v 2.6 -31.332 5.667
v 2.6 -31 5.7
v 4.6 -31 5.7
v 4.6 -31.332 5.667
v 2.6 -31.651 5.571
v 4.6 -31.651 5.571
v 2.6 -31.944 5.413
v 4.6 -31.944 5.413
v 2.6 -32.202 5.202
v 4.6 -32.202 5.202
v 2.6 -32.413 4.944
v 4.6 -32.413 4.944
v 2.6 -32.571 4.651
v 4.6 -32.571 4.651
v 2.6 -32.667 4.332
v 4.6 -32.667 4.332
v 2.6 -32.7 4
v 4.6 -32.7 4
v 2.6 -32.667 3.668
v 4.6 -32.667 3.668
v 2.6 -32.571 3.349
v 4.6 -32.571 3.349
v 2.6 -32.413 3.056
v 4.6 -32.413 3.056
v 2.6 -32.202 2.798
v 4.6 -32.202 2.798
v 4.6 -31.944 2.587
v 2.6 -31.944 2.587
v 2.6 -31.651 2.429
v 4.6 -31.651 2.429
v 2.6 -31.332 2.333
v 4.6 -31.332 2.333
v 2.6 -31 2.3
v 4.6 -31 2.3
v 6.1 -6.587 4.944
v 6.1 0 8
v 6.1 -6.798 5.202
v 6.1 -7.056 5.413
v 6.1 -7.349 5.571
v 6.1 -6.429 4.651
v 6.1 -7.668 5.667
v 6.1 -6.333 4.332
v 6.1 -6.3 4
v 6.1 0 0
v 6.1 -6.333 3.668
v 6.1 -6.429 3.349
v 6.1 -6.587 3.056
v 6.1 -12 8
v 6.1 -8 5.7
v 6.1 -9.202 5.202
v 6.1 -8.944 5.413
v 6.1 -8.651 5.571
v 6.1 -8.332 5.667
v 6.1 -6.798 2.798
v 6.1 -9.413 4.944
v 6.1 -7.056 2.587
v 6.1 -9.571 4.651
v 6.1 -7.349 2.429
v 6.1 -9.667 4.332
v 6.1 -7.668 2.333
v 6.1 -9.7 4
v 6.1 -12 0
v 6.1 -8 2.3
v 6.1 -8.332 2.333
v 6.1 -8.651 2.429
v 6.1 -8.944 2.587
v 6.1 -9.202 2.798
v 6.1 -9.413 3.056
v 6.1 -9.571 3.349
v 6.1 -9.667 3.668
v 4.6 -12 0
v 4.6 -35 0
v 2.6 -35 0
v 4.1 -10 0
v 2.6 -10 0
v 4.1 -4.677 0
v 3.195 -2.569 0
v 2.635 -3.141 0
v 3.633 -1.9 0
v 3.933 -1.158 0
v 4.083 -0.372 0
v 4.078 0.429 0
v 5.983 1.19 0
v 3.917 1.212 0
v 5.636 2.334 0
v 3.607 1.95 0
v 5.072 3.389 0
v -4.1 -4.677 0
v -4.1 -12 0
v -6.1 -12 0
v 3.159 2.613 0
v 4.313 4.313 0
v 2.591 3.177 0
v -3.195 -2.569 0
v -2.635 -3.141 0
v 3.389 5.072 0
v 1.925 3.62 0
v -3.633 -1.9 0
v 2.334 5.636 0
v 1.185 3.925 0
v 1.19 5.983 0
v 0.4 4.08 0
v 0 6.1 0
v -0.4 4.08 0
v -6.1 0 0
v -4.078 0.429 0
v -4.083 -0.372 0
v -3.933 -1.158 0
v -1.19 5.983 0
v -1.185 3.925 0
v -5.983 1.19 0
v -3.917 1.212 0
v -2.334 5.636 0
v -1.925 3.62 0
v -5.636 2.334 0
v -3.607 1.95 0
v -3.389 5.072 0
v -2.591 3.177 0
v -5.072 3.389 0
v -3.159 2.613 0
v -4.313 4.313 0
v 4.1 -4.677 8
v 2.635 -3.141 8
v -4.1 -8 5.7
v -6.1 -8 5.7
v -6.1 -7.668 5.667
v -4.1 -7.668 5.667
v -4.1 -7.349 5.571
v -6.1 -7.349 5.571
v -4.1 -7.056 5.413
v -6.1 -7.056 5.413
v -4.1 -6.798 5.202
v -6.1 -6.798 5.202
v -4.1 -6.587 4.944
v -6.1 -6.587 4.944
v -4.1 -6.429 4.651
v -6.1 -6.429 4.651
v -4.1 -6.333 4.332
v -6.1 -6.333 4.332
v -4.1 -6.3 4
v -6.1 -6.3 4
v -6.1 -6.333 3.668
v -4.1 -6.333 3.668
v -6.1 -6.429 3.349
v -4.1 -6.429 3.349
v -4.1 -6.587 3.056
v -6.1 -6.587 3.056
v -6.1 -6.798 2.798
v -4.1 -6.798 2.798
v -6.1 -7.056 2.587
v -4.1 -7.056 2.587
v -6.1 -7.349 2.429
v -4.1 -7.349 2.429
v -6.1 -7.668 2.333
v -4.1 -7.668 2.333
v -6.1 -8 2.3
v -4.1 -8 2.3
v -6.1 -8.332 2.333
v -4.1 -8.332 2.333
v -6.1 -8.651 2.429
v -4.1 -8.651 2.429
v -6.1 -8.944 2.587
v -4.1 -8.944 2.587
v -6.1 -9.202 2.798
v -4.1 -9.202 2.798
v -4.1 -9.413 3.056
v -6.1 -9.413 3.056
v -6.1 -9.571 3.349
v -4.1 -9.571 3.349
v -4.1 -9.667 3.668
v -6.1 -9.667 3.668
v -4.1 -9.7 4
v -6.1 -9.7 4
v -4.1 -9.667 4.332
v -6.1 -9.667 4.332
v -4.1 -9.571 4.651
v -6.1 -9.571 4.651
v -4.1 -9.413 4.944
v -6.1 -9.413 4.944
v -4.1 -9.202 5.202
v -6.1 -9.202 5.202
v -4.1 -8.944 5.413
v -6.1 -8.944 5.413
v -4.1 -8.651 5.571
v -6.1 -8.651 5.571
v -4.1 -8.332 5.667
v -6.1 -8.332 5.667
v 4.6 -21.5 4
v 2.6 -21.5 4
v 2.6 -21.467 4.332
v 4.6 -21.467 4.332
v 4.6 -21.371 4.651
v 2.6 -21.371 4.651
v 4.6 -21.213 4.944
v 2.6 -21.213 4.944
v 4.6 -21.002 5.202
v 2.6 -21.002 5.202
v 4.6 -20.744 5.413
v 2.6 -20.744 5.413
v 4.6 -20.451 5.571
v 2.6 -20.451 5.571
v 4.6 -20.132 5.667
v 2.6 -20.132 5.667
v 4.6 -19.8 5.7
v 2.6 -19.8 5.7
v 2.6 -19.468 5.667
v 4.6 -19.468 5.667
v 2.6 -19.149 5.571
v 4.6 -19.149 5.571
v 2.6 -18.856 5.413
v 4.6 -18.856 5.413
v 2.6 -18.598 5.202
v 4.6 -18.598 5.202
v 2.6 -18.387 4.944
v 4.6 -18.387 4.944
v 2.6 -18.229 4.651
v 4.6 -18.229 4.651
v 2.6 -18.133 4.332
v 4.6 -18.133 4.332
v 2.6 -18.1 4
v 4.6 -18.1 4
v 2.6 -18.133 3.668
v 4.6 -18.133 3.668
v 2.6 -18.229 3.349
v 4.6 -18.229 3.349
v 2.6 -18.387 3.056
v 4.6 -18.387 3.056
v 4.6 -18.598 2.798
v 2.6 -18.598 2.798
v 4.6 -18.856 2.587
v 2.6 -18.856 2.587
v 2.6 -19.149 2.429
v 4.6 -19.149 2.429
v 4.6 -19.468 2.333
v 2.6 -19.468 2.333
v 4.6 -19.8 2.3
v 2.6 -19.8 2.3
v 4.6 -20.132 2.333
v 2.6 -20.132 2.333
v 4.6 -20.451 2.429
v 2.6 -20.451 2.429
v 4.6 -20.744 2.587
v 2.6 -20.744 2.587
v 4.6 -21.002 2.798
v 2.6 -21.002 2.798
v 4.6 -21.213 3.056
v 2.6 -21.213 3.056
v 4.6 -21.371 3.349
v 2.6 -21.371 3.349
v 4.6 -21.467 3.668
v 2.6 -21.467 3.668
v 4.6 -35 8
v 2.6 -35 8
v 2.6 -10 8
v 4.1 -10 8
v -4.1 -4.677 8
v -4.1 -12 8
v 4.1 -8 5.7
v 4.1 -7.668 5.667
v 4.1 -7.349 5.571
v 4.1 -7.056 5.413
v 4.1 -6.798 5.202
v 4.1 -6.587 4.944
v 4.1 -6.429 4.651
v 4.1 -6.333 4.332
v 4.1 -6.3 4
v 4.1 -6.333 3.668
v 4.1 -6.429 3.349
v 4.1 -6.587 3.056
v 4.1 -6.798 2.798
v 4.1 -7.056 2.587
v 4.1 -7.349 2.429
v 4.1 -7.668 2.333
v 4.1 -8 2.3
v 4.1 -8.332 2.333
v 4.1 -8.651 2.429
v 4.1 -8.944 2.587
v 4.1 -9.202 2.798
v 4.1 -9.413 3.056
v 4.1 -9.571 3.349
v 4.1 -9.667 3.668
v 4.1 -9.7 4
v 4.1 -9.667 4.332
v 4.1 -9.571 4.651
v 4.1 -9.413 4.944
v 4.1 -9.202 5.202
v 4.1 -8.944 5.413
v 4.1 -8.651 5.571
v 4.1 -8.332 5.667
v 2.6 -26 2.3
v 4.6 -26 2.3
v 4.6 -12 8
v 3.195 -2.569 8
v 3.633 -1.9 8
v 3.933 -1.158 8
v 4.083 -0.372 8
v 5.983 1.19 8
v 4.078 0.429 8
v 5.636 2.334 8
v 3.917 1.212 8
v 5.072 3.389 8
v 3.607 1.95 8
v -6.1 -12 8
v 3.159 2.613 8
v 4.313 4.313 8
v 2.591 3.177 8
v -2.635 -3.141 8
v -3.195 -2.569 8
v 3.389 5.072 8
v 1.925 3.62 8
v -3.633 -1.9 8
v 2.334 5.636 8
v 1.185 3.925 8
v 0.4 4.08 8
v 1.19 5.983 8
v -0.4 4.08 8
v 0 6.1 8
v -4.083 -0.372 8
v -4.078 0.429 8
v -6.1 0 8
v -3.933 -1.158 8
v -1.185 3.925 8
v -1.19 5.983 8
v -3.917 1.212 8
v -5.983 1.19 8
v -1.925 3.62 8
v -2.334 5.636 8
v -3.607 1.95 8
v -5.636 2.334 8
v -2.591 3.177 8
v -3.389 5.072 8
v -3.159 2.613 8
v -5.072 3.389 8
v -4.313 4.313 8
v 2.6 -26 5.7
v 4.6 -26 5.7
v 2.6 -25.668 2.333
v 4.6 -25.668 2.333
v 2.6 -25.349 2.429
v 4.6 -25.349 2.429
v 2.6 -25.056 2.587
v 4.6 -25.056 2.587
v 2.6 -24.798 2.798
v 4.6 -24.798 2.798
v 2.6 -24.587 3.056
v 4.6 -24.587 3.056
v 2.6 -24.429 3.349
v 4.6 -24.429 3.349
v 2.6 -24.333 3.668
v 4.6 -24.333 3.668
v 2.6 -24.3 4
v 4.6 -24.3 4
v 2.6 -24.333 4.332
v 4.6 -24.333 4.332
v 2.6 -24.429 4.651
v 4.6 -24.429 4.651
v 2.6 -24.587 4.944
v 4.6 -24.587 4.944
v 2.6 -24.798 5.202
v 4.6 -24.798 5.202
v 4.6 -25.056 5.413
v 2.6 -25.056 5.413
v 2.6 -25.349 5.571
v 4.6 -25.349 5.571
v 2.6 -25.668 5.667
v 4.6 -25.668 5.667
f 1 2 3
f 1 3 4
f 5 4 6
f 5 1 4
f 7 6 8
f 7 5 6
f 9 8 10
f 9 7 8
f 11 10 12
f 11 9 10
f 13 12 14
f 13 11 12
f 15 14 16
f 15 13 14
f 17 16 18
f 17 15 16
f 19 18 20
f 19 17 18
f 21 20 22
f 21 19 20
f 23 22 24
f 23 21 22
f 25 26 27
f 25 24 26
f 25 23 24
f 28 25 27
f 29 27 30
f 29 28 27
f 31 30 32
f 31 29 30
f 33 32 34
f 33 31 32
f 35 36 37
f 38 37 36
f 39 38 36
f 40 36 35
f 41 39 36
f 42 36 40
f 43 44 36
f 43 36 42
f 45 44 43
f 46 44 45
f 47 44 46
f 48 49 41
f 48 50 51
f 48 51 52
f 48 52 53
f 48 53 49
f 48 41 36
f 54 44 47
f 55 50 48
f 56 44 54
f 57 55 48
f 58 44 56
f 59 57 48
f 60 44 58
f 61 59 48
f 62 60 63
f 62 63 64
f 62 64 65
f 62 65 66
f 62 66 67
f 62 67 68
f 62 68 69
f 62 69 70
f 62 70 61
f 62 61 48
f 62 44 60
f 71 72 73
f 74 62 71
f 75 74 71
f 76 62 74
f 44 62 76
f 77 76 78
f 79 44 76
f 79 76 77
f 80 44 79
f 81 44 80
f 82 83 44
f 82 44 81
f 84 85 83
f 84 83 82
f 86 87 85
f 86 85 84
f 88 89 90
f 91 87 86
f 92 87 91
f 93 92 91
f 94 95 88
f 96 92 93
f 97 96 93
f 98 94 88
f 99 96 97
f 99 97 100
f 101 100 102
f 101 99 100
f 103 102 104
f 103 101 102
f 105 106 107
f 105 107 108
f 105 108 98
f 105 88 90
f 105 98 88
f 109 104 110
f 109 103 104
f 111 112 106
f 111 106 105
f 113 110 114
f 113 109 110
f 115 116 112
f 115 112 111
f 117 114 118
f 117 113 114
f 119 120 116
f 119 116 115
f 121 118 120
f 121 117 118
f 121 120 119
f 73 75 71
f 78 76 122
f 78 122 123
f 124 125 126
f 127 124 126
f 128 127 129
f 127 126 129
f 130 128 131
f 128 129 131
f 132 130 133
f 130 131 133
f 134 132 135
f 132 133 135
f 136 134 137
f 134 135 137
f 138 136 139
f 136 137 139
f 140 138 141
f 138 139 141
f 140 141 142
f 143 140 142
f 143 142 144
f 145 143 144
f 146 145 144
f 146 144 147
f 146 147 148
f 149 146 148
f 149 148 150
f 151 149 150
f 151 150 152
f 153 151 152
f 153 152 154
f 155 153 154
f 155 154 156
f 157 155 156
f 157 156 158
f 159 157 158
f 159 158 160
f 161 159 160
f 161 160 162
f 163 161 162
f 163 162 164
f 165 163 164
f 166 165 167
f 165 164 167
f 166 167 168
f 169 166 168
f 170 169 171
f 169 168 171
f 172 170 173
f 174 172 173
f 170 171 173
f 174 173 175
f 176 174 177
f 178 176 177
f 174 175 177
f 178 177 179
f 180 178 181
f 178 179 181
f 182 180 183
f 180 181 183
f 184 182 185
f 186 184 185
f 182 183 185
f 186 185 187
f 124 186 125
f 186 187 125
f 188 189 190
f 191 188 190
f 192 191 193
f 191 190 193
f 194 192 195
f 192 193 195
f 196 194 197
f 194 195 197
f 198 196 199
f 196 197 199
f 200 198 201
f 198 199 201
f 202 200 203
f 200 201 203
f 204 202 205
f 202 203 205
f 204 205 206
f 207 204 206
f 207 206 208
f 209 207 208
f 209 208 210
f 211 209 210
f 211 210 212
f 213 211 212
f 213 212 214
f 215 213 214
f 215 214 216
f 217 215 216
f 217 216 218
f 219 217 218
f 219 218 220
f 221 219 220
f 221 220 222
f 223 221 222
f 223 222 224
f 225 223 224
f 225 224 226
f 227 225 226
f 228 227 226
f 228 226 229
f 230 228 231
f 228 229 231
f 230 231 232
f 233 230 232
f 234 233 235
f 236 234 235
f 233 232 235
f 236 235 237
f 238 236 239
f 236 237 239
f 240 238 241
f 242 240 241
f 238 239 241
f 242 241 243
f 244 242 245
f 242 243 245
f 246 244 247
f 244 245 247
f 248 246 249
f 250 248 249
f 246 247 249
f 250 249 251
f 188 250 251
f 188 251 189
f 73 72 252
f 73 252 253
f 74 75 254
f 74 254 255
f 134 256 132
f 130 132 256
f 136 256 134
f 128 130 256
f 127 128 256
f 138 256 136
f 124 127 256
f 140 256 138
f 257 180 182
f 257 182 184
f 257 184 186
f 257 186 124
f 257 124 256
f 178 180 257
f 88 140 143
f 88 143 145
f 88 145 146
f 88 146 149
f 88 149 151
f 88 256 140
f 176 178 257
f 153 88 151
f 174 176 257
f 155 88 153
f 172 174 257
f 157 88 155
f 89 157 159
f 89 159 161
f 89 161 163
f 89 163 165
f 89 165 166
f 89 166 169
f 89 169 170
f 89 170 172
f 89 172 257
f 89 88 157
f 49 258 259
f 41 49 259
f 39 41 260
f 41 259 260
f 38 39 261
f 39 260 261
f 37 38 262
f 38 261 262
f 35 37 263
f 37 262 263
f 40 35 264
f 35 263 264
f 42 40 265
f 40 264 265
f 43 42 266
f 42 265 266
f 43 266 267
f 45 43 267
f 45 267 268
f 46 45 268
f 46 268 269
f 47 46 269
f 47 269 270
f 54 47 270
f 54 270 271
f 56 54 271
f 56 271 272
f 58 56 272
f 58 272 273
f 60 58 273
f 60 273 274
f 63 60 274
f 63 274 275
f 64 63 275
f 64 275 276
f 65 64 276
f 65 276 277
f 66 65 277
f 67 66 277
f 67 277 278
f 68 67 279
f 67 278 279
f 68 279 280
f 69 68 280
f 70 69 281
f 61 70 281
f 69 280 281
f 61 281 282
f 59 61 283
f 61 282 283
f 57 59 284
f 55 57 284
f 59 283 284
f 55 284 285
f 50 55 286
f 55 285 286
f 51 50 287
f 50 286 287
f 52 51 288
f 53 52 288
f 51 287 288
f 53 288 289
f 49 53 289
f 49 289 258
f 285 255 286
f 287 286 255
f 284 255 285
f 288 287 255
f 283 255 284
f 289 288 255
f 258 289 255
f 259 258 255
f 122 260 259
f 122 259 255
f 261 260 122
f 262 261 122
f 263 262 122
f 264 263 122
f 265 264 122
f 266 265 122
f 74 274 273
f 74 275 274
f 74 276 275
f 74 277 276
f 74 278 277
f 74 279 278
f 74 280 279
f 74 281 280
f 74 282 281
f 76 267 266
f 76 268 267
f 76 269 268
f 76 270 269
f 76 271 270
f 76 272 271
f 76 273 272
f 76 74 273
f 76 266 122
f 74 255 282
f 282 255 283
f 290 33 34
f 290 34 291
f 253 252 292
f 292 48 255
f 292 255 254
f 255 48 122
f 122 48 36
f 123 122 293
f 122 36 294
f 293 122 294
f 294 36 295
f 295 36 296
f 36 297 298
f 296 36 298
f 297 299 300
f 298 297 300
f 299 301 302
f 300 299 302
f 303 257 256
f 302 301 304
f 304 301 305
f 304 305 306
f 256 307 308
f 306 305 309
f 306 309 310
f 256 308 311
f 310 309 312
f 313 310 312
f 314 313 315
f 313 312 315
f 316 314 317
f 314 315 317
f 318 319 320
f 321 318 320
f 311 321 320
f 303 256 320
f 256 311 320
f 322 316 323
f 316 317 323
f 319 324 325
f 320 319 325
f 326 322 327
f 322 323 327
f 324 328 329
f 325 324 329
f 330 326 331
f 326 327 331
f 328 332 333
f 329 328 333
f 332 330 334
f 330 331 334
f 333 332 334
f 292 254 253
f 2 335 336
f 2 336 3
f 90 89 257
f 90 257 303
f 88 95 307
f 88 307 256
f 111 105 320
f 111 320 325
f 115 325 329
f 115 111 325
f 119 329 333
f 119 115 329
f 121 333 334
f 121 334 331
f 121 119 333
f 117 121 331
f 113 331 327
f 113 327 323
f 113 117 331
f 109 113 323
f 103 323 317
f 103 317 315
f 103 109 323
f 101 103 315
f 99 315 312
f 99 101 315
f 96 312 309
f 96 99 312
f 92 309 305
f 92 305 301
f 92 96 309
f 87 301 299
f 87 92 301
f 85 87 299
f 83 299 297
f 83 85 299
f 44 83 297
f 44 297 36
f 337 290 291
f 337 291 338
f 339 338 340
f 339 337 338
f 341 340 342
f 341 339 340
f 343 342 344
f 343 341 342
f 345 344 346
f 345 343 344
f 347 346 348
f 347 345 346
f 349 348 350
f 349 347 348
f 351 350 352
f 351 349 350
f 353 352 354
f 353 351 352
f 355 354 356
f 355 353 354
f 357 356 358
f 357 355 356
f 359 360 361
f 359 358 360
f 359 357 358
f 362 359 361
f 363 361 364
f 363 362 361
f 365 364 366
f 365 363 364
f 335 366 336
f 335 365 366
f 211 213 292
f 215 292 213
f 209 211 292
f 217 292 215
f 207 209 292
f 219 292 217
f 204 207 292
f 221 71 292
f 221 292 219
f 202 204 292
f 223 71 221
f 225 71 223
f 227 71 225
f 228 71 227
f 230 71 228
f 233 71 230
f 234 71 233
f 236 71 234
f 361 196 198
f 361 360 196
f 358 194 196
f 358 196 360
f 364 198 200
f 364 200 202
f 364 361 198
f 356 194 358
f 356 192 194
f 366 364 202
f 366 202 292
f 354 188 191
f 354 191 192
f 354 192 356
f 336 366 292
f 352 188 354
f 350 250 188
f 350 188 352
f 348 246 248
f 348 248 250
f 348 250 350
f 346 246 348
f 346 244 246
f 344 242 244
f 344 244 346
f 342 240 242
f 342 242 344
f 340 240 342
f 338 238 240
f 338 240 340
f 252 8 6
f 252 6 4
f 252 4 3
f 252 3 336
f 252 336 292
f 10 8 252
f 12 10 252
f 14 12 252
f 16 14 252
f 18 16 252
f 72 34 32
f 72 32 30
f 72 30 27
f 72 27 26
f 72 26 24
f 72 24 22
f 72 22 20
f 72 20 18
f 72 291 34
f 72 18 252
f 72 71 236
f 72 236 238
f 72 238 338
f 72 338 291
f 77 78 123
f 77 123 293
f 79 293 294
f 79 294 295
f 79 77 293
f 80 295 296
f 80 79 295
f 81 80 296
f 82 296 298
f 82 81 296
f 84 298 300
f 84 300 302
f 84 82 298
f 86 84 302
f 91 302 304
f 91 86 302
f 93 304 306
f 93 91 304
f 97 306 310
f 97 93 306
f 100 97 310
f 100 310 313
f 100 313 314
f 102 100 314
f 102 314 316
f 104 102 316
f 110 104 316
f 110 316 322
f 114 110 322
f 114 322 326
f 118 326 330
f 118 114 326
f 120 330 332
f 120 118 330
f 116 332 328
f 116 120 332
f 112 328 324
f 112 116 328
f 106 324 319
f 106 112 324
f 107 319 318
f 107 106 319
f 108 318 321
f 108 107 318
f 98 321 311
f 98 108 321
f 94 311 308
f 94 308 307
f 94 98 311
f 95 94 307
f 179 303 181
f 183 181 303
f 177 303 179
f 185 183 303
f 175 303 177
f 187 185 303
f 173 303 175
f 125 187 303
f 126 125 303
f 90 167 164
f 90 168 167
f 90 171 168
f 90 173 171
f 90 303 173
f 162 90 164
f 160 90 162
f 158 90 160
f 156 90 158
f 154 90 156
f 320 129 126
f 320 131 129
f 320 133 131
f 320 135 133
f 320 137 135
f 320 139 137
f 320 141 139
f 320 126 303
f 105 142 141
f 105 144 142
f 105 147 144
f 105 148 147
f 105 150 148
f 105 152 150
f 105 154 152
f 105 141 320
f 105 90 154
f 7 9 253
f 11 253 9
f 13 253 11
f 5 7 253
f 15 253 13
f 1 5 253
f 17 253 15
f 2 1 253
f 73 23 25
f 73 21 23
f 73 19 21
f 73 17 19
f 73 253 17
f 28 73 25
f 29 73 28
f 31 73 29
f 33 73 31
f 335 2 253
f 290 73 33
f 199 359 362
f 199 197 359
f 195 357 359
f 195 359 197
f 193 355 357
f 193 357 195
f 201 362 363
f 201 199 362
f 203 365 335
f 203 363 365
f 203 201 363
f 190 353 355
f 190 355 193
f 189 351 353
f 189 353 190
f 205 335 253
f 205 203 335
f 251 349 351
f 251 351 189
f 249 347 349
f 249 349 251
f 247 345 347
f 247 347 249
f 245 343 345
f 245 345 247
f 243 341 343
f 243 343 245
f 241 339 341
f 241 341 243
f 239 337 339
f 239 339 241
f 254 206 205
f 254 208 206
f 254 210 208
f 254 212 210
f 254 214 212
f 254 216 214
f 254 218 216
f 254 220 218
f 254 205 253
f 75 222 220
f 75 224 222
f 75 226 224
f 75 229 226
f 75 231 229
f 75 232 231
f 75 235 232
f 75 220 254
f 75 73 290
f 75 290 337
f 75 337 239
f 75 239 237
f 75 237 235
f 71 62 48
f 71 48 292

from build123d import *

# Parameters (mm, degrees)
RESSALTO_EXTRUS_O1_DEPTH = 8
ESBO_O2_R                = 1.7
CORTE_EXTRUS_O1_DEPTH    = 38.918860742


with BuildPart() as part:
    # Esboço1 → Ressalto-extrusão1 (new body)
    with BuildSketch(Plane.XY):
        with BuildLine():
            Line((4.1, -4.676945082), (2.6354292, -3.140782217))
            ThreePointArc((2.6354292, -3.140782217), (0, 4.1), (-2.6354292, -3.140782217))
            Line((-2.6354292, -3.140782217), (-4.1, -4.676945082))
            Line((-4.1, -4.676945082), (-4.1, -12))
            Line((-4.1, -12), (-6.1, -12))
            Line((-6.1, -12), (-6.1, 0))
            ThreePointArc((-6.1, 0), (0, 6.1), (6.1, 0))
            Line((6.1, 0), (6.1, -12))
            Line((6.1, -12), (4.6, -12))
            Line((4.6, -12), (4.6, -35))
            Line((4.6, -35), (2.6, -35))
            Line((2.6, -35), (2.6, -10))
            Line((2.6, -10), (4.1, -10))
            Line((4.1, -10), (4.1, -4.676945082))
        make_face()
    extrude(amount=RESSALTO_EXTRUS_O1_DEPTH)

    # Esboço2 → Corte-extrusão1 (cut, through all)
    with BuildSketch(Plane.ZY.offset(6.1)):
        with Locations((4, -8)):
            Circle(ESBO_O2_R)
        with Locations(Location((4, -19.8, 0), (0, 0, 270))):
            Circle(ESBO_O2_R)
        with BuildLine():
            Line((5.7, -26), (5.7, -31))
            ThreePointArc((5.7, -31), (4, -32.7), (2.3, -31))
            Line((2.3, -31), (2.3, -26))
            ThreePointArc((2.3, -26), (4, -24.3), (5.7, -26))
        make_face()
    extrude(amount=-CORTE_EXTRUS_O1_DEPTH, mode=Mode.SUBTRACT)


solid = part.part
